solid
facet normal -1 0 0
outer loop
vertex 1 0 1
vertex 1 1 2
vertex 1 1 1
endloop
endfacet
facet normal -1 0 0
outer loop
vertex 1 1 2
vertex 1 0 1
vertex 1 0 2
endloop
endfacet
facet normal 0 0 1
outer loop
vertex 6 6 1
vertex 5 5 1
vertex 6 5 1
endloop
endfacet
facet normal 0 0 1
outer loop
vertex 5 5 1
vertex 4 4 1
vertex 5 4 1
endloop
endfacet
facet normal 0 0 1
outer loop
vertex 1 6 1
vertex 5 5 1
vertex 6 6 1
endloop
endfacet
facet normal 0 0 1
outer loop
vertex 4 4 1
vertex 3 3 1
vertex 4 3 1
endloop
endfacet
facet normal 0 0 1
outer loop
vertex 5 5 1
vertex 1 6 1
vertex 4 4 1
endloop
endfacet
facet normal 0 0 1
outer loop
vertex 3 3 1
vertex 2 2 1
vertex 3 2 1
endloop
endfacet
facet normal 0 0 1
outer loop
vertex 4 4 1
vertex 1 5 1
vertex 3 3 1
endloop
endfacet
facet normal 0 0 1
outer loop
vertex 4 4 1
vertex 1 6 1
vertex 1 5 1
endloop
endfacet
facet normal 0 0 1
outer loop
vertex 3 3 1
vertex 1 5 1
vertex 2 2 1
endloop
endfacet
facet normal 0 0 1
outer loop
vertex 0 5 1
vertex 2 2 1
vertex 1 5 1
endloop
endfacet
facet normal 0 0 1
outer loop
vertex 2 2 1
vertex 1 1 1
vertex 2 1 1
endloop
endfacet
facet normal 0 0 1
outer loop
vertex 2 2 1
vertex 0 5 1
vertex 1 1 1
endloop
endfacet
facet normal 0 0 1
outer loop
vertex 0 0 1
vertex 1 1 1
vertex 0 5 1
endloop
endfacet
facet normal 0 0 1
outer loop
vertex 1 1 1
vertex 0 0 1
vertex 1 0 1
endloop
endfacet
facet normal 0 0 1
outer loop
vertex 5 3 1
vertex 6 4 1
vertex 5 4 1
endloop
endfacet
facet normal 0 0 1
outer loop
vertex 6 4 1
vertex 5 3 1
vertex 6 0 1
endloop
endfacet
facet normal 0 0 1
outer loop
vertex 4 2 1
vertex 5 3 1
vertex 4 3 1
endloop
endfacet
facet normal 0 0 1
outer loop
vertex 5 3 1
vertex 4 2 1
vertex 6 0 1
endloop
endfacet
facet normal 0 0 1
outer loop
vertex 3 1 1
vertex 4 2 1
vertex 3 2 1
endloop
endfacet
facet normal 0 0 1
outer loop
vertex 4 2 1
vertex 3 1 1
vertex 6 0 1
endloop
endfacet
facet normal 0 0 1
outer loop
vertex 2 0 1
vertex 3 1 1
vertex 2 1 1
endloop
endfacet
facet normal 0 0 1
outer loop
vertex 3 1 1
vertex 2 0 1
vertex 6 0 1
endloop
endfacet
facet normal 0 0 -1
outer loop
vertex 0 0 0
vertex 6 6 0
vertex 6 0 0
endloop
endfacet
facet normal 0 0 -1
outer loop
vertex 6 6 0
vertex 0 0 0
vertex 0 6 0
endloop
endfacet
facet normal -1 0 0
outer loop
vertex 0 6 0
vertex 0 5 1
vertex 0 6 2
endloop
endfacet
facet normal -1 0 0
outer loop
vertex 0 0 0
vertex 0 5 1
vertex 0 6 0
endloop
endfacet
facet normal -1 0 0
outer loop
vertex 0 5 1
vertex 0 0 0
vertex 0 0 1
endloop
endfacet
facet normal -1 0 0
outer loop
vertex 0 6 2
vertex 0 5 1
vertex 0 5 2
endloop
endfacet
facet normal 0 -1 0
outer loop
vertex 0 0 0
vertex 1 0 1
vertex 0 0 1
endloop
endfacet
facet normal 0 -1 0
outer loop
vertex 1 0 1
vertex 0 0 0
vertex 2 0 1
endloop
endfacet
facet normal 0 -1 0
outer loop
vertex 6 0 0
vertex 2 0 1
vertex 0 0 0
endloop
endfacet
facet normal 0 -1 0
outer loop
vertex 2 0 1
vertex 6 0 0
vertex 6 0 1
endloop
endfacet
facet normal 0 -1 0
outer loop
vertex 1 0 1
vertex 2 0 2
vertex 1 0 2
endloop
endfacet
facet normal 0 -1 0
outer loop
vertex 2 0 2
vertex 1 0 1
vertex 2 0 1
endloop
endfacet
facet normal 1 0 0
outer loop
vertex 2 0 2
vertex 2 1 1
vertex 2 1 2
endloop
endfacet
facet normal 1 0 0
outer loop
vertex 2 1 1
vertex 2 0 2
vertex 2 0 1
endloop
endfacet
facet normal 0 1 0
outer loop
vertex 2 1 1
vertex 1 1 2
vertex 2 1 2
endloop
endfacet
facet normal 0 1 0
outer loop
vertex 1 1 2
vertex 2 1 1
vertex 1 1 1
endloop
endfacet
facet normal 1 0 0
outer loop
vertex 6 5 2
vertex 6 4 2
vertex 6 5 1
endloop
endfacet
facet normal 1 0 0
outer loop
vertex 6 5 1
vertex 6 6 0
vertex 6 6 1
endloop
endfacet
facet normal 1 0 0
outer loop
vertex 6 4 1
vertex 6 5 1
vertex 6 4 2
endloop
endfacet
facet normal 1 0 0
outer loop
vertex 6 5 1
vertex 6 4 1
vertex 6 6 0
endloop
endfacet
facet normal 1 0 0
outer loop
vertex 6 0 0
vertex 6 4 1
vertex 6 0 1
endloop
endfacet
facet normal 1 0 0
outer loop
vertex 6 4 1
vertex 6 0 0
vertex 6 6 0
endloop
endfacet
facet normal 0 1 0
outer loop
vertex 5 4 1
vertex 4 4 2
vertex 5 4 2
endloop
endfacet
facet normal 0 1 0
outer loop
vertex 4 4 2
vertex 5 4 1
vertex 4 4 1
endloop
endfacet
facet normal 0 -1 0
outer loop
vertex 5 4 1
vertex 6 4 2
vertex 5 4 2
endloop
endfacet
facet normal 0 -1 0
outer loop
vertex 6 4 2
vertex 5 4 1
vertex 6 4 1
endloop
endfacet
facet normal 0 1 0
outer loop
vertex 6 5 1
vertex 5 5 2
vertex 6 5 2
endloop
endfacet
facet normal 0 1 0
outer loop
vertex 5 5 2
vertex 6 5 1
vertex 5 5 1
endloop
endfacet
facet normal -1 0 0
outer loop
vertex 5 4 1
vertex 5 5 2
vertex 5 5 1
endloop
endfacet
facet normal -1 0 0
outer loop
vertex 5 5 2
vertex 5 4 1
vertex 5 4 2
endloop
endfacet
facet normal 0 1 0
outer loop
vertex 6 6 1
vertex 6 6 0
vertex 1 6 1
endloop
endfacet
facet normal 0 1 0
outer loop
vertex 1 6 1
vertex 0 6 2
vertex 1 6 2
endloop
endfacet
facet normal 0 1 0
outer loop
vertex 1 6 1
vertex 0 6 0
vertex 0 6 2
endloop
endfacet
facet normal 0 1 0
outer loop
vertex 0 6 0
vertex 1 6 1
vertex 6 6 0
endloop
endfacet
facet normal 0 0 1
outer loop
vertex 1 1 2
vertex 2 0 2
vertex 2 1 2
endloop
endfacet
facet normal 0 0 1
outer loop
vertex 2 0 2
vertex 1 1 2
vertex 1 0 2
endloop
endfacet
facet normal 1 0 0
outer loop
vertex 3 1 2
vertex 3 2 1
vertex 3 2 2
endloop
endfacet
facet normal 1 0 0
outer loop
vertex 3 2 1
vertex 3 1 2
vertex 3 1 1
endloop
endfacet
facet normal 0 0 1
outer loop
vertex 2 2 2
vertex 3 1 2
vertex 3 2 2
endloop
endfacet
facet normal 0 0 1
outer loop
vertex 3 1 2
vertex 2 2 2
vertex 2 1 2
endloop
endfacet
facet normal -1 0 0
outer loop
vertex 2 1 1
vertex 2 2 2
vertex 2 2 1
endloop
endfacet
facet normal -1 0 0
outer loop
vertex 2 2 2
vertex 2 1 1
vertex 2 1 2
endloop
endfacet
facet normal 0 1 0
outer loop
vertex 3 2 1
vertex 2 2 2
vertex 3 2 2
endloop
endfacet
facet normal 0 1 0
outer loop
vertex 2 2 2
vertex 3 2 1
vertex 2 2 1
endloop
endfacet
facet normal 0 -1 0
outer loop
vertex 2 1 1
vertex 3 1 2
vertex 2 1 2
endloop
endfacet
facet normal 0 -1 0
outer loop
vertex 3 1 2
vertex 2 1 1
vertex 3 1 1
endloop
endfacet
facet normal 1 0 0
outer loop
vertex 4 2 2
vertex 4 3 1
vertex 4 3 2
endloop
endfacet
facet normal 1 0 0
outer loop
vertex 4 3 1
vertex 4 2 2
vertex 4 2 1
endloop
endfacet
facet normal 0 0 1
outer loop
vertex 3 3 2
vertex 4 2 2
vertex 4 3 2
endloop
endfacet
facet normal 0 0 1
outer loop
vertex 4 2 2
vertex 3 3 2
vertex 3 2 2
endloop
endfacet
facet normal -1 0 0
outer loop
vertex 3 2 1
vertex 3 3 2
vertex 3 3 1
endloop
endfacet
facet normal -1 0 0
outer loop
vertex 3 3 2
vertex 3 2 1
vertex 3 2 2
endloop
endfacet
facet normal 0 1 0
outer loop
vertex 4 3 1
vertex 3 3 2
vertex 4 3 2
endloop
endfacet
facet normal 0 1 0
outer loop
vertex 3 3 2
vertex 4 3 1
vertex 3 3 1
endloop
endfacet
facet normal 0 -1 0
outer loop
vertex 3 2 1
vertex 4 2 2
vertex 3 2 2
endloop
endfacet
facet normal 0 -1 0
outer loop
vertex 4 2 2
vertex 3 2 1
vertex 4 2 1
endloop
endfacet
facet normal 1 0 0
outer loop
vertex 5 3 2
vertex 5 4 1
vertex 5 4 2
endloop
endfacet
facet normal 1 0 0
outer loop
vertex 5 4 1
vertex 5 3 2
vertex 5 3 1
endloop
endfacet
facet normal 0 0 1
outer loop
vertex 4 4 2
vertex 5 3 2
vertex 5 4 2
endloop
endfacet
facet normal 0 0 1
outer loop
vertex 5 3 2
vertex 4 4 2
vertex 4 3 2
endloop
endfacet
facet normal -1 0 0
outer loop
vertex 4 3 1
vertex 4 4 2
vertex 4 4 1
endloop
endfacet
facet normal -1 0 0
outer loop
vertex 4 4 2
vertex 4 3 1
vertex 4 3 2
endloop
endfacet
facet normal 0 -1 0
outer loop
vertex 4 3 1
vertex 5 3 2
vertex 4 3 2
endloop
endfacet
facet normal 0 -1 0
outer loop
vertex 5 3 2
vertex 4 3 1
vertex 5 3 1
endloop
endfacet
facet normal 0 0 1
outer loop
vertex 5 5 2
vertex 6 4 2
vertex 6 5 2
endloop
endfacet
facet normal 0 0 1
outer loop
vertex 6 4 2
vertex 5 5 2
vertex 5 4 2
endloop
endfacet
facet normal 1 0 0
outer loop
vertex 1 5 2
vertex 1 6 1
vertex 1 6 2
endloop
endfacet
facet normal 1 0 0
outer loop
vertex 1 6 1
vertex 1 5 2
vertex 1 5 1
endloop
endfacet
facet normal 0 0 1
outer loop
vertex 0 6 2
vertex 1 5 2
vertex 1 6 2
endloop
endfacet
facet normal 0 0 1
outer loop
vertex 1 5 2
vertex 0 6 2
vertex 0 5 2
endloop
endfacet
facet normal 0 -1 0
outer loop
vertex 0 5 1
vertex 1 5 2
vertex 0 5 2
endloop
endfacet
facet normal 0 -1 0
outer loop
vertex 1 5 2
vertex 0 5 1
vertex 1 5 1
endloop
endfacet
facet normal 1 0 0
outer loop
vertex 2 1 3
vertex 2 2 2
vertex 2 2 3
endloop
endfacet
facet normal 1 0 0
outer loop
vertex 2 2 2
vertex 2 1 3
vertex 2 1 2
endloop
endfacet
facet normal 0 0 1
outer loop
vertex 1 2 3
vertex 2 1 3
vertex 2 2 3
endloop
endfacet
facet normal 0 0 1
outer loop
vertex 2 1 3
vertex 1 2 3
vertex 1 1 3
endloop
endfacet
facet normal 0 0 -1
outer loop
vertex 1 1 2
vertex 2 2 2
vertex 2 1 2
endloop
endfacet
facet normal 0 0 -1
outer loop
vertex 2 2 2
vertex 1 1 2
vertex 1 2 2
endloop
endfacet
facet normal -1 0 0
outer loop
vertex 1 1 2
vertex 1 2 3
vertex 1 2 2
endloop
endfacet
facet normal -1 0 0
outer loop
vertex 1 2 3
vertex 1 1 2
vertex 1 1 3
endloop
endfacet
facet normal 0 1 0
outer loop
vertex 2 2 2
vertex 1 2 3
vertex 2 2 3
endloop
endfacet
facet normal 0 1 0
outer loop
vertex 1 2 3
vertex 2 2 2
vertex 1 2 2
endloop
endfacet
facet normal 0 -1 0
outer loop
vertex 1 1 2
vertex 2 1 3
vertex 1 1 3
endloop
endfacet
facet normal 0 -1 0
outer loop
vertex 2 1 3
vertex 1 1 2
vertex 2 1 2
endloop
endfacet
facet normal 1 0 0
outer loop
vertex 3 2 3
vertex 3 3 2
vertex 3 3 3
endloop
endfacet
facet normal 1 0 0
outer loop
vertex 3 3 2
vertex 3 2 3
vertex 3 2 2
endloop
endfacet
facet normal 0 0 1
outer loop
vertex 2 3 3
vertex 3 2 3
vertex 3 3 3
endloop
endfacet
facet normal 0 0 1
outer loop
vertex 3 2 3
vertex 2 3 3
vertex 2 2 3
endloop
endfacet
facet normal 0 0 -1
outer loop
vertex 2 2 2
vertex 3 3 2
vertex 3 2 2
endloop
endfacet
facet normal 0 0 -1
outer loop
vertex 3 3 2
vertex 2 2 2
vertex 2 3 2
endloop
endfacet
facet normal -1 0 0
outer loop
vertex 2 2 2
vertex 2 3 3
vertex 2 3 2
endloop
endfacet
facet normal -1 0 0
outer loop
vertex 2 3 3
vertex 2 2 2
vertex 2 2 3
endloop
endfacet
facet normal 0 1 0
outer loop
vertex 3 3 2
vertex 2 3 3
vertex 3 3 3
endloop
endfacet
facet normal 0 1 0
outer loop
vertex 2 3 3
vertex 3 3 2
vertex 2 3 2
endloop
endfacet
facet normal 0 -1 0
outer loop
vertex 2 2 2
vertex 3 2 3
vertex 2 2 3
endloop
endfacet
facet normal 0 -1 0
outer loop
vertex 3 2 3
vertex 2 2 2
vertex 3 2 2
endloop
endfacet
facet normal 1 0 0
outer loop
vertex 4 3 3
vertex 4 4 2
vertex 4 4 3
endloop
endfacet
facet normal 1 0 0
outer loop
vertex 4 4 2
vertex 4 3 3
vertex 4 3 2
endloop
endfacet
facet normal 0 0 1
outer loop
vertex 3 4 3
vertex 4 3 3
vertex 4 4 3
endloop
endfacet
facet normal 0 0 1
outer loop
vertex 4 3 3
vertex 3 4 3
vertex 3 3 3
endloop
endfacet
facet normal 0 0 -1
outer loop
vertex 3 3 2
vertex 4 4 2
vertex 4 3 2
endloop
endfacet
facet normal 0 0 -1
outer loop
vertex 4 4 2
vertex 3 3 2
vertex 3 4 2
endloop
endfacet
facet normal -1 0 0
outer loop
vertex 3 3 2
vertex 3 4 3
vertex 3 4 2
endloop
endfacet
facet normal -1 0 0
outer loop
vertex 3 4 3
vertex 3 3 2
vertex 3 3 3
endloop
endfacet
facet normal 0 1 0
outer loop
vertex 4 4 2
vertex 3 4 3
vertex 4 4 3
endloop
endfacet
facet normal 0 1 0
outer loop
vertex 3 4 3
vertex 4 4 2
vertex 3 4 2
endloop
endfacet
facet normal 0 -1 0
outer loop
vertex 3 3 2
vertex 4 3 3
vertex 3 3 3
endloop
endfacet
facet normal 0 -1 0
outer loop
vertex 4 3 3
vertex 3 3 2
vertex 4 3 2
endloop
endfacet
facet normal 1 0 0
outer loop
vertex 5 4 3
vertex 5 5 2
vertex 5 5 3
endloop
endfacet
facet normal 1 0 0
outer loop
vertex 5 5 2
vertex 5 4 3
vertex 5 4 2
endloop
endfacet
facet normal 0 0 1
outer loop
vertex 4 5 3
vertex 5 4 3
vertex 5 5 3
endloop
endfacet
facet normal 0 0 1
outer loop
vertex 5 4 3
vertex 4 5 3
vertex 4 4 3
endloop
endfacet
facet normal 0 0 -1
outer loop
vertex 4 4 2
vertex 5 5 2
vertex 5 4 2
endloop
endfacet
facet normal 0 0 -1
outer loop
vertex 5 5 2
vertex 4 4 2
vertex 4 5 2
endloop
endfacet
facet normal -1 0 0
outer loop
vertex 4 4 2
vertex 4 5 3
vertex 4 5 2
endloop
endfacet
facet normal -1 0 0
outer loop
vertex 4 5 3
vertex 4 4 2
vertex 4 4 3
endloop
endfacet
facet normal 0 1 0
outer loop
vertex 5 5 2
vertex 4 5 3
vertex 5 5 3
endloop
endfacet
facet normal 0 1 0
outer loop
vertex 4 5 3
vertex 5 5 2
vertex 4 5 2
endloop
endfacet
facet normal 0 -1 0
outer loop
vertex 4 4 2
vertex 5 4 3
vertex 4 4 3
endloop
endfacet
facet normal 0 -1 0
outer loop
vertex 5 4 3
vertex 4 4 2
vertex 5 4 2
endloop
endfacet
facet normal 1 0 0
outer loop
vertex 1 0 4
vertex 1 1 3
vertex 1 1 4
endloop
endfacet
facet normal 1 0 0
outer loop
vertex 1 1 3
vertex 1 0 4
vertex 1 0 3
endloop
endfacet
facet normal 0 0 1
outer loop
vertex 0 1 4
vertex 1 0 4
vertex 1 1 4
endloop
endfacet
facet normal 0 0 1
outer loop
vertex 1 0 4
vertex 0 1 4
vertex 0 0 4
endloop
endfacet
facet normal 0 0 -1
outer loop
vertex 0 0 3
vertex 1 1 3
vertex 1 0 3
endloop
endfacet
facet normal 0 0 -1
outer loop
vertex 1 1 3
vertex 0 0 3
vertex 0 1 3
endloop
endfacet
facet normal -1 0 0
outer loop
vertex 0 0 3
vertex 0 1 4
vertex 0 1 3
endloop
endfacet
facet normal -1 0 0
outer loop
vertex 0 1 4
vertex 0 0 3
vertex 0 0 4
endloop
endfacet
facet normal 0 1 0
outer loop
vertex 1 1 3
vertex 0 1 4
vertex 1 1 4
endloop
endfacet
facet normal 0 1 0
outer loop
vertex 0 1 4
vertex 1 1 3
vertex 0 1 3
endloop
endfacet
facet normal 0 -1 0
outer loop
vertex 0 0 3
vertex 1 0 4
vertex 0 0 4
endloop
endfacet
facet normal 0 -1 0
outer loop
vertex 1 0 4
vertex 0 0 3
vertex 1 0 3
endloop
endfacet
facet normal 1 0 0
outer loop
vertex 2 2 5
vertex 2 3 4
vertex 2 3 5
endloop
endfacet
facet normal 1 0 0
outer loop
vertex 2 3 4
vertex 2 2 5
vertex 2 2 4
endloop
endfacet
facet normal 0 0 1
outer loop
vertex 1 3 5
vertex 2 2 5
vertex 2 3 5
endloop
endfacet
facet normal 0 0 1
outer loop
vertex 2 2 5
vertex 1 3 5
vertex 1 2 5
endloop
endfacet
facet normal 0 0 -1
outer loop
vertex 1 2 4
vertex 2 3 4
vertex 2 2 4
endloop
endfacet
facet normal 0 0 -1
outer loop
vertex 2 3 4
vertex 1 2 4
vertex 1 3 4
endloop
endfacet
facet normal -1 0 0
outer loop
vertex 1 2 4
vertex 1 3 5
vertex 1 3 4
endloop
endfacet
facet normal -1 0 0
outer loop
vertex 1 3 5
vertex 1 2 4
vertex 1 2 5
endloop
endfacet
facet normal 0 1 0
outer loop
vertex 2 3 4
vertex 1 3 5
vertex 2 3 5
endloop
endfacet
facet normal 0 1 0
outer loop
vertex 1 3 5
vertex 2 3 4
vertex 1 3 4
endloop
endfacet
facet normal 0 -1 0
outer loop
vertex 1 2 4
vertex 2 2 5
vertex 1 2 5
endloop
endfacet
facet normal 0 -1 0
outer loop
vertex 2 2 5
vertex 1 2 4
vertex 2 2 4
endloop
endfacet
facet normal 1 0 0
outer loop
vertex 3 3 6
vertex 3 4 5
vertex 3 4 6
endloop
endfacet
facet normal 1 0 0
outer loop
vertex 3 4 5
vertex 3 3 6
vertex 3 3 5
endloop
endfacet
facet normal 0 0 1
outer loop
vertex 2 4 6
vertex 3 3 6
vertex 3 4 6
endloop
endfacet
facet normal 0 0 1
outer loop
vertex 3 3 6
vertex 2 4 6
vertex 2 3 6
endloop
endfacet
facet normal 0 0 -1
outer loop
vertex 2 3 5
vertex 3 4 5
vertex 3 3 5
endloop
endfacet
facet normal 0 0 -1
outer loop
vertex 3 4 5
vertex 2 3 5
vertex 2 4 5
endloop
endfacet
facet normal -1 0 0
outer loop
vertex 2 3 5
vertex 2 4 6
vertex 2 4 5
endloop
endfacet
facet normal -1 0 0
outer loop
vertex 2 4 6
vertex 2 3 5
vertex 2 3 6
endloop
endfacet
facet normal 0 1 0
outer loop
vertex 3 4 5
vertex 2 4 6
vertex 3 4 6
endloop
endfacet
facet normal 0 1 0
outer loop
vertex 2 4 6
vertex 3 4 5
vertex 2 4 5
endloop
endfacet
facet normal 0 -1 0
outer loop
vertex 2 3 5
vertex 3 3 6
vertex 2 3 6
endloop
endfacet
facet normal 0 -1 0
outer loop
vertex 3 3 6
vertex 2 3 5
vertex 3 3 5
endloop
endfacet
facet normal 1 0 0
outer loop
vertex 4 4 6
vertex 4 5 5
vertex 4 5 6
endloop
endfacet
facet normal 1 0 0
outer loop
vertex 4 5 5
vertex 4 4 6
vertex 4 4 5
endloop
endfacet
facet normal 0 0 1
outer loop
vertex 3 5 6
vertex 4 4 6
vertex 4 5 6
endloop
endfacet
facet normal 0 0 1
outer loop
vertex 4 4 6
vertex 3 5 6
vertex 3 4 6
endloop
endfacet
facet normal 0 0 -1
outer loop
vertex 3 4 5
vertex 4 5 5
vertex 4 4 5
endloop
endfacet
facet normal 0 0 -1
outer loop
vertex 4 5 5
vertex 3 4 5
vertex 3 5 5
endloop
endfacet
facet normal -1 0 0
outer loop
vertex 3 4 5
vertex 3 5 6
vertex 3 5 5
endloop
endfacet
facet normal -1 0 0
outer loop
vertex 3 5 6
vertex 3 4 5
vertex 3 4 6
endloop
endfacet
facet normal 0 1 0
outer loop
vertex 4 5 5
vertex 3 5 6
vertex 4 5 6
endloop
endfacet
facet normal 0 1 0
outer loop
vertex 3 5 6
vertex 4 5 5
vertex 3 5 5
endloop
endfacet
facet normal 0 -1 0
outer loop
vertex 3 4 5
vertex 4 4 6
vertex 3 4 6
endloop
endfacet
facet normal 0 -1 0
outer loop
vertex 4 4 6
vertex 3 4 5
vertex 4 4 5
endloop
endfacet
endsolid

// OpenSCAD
union() {
    translate([0, 0, 0]) cube([1, 1, 1]);
    translate([1, 0, 0]) cube([1, 1, 1]);
    translate([2, 0, 0]) cube([1, 1, 1]);
    translate([3, 0, 0]) cube([1, 1, 1]);
    translate([4, 0, 0]) cube([1, 1, 1]);
    translate([5, 0, 0]) cube([1, 1, 1]);
    translate([0, 1, 0]) cube([1, 1, 1]);
    translate([1, 1, 0]) cube([1, 1, 1]);
    translate([2, 1, 0]) cube([1, 1, 1]);
    translate([3, 1, 0]) cube([1, 1, 1]);
    translate([4, 1, 0]) cube([1, 1, 1]);
    translate([5, 1, 0]) cube([1, 1, 1]);
    translate([0, 2, 0]) cube([1, 1, 1]);
    translate([1, 2, 0]) cube([1, 1, 1]);
    translate([2, 2, 0]) cube([1, 1, 1]);
    translate([3, 2, 0]) cube([1, 1, 1]);
    translate([4, 2, 0]) cube([1, 1, 1]);
    translate([5, 2, 0]) cube([1, 1, 1]);
    translate([0, 3, 0]) cube([1, 1, 1]);
    translate([1, 3, 0]) cube([1, 1, 1]);
    translate([2, 3, 0]) cube([1, 1, 1]);
    translate([3, 3, 0]) cube([1, 1, 1]);
    translate([4, 3, 0]) cube([1, 1, 1]);
    translate([5, 3, 0]) cube([1, 1, 1]);
    translate([0, 4, 0]) cube([1, 1, 1]);
    translate([1, 4, 0]) cube([1, 1, 1]);
    translate([2, 4, 0]) cube([1, 1, 1]);
    translate([3, 4, 0]) cube([1, 1, 1]);
    translate([4, 4, 0]) cube([1, 1, 1]);
    translate([5, 4, 0]) cube([1, 1, 1]);
    translate([0, 5, 0]) cube([1, 1, 1]);
    translate([1, 5, 0]) cube([1, 1, 1]);
    translate([2, 5, 0]) cube([1, 1, 1]);
    translate([3, 5, 0]) cube([1, 1, 1]);
    translate([4, 5, 0]) cube([1, 1, 1]);
    translate([5, 5, 0]) cube([1, 1, 1]);
    translate([1, 0, 1]) cube([1, 1, 1]);
    translate([2, 1, 1]) cube([1, 1, 1]);
    translate([3, 2, 1]) cube([1, 1, 1]);
    translate([4, 3, 1]) cube([1, 1, 1]);
    translate([5, 4, 1]) cube([1, 1, 1]);
    translate([0, 5, 1]) cube([1, 1, 1]);
    translate([1, 1, 2]) cube([1, 1, 1]);
    translate([2, 2, 2]) cube([1, 1, 1]);
    translate([3, 3, 2]) cube([1, 1, 1]);
    translate([4, 4, 2]) cube([1, 1, 1]);
    translate([0, 0, 3]) cube([1, 1, 1]);
    translate([1, 2, 4]) cube([1, 1, 1]);
    translate([2, 3, 5]) cube([1, 1, 1]);
    translate([3, 4, 5]) cube([1, 1, 1]);
}
